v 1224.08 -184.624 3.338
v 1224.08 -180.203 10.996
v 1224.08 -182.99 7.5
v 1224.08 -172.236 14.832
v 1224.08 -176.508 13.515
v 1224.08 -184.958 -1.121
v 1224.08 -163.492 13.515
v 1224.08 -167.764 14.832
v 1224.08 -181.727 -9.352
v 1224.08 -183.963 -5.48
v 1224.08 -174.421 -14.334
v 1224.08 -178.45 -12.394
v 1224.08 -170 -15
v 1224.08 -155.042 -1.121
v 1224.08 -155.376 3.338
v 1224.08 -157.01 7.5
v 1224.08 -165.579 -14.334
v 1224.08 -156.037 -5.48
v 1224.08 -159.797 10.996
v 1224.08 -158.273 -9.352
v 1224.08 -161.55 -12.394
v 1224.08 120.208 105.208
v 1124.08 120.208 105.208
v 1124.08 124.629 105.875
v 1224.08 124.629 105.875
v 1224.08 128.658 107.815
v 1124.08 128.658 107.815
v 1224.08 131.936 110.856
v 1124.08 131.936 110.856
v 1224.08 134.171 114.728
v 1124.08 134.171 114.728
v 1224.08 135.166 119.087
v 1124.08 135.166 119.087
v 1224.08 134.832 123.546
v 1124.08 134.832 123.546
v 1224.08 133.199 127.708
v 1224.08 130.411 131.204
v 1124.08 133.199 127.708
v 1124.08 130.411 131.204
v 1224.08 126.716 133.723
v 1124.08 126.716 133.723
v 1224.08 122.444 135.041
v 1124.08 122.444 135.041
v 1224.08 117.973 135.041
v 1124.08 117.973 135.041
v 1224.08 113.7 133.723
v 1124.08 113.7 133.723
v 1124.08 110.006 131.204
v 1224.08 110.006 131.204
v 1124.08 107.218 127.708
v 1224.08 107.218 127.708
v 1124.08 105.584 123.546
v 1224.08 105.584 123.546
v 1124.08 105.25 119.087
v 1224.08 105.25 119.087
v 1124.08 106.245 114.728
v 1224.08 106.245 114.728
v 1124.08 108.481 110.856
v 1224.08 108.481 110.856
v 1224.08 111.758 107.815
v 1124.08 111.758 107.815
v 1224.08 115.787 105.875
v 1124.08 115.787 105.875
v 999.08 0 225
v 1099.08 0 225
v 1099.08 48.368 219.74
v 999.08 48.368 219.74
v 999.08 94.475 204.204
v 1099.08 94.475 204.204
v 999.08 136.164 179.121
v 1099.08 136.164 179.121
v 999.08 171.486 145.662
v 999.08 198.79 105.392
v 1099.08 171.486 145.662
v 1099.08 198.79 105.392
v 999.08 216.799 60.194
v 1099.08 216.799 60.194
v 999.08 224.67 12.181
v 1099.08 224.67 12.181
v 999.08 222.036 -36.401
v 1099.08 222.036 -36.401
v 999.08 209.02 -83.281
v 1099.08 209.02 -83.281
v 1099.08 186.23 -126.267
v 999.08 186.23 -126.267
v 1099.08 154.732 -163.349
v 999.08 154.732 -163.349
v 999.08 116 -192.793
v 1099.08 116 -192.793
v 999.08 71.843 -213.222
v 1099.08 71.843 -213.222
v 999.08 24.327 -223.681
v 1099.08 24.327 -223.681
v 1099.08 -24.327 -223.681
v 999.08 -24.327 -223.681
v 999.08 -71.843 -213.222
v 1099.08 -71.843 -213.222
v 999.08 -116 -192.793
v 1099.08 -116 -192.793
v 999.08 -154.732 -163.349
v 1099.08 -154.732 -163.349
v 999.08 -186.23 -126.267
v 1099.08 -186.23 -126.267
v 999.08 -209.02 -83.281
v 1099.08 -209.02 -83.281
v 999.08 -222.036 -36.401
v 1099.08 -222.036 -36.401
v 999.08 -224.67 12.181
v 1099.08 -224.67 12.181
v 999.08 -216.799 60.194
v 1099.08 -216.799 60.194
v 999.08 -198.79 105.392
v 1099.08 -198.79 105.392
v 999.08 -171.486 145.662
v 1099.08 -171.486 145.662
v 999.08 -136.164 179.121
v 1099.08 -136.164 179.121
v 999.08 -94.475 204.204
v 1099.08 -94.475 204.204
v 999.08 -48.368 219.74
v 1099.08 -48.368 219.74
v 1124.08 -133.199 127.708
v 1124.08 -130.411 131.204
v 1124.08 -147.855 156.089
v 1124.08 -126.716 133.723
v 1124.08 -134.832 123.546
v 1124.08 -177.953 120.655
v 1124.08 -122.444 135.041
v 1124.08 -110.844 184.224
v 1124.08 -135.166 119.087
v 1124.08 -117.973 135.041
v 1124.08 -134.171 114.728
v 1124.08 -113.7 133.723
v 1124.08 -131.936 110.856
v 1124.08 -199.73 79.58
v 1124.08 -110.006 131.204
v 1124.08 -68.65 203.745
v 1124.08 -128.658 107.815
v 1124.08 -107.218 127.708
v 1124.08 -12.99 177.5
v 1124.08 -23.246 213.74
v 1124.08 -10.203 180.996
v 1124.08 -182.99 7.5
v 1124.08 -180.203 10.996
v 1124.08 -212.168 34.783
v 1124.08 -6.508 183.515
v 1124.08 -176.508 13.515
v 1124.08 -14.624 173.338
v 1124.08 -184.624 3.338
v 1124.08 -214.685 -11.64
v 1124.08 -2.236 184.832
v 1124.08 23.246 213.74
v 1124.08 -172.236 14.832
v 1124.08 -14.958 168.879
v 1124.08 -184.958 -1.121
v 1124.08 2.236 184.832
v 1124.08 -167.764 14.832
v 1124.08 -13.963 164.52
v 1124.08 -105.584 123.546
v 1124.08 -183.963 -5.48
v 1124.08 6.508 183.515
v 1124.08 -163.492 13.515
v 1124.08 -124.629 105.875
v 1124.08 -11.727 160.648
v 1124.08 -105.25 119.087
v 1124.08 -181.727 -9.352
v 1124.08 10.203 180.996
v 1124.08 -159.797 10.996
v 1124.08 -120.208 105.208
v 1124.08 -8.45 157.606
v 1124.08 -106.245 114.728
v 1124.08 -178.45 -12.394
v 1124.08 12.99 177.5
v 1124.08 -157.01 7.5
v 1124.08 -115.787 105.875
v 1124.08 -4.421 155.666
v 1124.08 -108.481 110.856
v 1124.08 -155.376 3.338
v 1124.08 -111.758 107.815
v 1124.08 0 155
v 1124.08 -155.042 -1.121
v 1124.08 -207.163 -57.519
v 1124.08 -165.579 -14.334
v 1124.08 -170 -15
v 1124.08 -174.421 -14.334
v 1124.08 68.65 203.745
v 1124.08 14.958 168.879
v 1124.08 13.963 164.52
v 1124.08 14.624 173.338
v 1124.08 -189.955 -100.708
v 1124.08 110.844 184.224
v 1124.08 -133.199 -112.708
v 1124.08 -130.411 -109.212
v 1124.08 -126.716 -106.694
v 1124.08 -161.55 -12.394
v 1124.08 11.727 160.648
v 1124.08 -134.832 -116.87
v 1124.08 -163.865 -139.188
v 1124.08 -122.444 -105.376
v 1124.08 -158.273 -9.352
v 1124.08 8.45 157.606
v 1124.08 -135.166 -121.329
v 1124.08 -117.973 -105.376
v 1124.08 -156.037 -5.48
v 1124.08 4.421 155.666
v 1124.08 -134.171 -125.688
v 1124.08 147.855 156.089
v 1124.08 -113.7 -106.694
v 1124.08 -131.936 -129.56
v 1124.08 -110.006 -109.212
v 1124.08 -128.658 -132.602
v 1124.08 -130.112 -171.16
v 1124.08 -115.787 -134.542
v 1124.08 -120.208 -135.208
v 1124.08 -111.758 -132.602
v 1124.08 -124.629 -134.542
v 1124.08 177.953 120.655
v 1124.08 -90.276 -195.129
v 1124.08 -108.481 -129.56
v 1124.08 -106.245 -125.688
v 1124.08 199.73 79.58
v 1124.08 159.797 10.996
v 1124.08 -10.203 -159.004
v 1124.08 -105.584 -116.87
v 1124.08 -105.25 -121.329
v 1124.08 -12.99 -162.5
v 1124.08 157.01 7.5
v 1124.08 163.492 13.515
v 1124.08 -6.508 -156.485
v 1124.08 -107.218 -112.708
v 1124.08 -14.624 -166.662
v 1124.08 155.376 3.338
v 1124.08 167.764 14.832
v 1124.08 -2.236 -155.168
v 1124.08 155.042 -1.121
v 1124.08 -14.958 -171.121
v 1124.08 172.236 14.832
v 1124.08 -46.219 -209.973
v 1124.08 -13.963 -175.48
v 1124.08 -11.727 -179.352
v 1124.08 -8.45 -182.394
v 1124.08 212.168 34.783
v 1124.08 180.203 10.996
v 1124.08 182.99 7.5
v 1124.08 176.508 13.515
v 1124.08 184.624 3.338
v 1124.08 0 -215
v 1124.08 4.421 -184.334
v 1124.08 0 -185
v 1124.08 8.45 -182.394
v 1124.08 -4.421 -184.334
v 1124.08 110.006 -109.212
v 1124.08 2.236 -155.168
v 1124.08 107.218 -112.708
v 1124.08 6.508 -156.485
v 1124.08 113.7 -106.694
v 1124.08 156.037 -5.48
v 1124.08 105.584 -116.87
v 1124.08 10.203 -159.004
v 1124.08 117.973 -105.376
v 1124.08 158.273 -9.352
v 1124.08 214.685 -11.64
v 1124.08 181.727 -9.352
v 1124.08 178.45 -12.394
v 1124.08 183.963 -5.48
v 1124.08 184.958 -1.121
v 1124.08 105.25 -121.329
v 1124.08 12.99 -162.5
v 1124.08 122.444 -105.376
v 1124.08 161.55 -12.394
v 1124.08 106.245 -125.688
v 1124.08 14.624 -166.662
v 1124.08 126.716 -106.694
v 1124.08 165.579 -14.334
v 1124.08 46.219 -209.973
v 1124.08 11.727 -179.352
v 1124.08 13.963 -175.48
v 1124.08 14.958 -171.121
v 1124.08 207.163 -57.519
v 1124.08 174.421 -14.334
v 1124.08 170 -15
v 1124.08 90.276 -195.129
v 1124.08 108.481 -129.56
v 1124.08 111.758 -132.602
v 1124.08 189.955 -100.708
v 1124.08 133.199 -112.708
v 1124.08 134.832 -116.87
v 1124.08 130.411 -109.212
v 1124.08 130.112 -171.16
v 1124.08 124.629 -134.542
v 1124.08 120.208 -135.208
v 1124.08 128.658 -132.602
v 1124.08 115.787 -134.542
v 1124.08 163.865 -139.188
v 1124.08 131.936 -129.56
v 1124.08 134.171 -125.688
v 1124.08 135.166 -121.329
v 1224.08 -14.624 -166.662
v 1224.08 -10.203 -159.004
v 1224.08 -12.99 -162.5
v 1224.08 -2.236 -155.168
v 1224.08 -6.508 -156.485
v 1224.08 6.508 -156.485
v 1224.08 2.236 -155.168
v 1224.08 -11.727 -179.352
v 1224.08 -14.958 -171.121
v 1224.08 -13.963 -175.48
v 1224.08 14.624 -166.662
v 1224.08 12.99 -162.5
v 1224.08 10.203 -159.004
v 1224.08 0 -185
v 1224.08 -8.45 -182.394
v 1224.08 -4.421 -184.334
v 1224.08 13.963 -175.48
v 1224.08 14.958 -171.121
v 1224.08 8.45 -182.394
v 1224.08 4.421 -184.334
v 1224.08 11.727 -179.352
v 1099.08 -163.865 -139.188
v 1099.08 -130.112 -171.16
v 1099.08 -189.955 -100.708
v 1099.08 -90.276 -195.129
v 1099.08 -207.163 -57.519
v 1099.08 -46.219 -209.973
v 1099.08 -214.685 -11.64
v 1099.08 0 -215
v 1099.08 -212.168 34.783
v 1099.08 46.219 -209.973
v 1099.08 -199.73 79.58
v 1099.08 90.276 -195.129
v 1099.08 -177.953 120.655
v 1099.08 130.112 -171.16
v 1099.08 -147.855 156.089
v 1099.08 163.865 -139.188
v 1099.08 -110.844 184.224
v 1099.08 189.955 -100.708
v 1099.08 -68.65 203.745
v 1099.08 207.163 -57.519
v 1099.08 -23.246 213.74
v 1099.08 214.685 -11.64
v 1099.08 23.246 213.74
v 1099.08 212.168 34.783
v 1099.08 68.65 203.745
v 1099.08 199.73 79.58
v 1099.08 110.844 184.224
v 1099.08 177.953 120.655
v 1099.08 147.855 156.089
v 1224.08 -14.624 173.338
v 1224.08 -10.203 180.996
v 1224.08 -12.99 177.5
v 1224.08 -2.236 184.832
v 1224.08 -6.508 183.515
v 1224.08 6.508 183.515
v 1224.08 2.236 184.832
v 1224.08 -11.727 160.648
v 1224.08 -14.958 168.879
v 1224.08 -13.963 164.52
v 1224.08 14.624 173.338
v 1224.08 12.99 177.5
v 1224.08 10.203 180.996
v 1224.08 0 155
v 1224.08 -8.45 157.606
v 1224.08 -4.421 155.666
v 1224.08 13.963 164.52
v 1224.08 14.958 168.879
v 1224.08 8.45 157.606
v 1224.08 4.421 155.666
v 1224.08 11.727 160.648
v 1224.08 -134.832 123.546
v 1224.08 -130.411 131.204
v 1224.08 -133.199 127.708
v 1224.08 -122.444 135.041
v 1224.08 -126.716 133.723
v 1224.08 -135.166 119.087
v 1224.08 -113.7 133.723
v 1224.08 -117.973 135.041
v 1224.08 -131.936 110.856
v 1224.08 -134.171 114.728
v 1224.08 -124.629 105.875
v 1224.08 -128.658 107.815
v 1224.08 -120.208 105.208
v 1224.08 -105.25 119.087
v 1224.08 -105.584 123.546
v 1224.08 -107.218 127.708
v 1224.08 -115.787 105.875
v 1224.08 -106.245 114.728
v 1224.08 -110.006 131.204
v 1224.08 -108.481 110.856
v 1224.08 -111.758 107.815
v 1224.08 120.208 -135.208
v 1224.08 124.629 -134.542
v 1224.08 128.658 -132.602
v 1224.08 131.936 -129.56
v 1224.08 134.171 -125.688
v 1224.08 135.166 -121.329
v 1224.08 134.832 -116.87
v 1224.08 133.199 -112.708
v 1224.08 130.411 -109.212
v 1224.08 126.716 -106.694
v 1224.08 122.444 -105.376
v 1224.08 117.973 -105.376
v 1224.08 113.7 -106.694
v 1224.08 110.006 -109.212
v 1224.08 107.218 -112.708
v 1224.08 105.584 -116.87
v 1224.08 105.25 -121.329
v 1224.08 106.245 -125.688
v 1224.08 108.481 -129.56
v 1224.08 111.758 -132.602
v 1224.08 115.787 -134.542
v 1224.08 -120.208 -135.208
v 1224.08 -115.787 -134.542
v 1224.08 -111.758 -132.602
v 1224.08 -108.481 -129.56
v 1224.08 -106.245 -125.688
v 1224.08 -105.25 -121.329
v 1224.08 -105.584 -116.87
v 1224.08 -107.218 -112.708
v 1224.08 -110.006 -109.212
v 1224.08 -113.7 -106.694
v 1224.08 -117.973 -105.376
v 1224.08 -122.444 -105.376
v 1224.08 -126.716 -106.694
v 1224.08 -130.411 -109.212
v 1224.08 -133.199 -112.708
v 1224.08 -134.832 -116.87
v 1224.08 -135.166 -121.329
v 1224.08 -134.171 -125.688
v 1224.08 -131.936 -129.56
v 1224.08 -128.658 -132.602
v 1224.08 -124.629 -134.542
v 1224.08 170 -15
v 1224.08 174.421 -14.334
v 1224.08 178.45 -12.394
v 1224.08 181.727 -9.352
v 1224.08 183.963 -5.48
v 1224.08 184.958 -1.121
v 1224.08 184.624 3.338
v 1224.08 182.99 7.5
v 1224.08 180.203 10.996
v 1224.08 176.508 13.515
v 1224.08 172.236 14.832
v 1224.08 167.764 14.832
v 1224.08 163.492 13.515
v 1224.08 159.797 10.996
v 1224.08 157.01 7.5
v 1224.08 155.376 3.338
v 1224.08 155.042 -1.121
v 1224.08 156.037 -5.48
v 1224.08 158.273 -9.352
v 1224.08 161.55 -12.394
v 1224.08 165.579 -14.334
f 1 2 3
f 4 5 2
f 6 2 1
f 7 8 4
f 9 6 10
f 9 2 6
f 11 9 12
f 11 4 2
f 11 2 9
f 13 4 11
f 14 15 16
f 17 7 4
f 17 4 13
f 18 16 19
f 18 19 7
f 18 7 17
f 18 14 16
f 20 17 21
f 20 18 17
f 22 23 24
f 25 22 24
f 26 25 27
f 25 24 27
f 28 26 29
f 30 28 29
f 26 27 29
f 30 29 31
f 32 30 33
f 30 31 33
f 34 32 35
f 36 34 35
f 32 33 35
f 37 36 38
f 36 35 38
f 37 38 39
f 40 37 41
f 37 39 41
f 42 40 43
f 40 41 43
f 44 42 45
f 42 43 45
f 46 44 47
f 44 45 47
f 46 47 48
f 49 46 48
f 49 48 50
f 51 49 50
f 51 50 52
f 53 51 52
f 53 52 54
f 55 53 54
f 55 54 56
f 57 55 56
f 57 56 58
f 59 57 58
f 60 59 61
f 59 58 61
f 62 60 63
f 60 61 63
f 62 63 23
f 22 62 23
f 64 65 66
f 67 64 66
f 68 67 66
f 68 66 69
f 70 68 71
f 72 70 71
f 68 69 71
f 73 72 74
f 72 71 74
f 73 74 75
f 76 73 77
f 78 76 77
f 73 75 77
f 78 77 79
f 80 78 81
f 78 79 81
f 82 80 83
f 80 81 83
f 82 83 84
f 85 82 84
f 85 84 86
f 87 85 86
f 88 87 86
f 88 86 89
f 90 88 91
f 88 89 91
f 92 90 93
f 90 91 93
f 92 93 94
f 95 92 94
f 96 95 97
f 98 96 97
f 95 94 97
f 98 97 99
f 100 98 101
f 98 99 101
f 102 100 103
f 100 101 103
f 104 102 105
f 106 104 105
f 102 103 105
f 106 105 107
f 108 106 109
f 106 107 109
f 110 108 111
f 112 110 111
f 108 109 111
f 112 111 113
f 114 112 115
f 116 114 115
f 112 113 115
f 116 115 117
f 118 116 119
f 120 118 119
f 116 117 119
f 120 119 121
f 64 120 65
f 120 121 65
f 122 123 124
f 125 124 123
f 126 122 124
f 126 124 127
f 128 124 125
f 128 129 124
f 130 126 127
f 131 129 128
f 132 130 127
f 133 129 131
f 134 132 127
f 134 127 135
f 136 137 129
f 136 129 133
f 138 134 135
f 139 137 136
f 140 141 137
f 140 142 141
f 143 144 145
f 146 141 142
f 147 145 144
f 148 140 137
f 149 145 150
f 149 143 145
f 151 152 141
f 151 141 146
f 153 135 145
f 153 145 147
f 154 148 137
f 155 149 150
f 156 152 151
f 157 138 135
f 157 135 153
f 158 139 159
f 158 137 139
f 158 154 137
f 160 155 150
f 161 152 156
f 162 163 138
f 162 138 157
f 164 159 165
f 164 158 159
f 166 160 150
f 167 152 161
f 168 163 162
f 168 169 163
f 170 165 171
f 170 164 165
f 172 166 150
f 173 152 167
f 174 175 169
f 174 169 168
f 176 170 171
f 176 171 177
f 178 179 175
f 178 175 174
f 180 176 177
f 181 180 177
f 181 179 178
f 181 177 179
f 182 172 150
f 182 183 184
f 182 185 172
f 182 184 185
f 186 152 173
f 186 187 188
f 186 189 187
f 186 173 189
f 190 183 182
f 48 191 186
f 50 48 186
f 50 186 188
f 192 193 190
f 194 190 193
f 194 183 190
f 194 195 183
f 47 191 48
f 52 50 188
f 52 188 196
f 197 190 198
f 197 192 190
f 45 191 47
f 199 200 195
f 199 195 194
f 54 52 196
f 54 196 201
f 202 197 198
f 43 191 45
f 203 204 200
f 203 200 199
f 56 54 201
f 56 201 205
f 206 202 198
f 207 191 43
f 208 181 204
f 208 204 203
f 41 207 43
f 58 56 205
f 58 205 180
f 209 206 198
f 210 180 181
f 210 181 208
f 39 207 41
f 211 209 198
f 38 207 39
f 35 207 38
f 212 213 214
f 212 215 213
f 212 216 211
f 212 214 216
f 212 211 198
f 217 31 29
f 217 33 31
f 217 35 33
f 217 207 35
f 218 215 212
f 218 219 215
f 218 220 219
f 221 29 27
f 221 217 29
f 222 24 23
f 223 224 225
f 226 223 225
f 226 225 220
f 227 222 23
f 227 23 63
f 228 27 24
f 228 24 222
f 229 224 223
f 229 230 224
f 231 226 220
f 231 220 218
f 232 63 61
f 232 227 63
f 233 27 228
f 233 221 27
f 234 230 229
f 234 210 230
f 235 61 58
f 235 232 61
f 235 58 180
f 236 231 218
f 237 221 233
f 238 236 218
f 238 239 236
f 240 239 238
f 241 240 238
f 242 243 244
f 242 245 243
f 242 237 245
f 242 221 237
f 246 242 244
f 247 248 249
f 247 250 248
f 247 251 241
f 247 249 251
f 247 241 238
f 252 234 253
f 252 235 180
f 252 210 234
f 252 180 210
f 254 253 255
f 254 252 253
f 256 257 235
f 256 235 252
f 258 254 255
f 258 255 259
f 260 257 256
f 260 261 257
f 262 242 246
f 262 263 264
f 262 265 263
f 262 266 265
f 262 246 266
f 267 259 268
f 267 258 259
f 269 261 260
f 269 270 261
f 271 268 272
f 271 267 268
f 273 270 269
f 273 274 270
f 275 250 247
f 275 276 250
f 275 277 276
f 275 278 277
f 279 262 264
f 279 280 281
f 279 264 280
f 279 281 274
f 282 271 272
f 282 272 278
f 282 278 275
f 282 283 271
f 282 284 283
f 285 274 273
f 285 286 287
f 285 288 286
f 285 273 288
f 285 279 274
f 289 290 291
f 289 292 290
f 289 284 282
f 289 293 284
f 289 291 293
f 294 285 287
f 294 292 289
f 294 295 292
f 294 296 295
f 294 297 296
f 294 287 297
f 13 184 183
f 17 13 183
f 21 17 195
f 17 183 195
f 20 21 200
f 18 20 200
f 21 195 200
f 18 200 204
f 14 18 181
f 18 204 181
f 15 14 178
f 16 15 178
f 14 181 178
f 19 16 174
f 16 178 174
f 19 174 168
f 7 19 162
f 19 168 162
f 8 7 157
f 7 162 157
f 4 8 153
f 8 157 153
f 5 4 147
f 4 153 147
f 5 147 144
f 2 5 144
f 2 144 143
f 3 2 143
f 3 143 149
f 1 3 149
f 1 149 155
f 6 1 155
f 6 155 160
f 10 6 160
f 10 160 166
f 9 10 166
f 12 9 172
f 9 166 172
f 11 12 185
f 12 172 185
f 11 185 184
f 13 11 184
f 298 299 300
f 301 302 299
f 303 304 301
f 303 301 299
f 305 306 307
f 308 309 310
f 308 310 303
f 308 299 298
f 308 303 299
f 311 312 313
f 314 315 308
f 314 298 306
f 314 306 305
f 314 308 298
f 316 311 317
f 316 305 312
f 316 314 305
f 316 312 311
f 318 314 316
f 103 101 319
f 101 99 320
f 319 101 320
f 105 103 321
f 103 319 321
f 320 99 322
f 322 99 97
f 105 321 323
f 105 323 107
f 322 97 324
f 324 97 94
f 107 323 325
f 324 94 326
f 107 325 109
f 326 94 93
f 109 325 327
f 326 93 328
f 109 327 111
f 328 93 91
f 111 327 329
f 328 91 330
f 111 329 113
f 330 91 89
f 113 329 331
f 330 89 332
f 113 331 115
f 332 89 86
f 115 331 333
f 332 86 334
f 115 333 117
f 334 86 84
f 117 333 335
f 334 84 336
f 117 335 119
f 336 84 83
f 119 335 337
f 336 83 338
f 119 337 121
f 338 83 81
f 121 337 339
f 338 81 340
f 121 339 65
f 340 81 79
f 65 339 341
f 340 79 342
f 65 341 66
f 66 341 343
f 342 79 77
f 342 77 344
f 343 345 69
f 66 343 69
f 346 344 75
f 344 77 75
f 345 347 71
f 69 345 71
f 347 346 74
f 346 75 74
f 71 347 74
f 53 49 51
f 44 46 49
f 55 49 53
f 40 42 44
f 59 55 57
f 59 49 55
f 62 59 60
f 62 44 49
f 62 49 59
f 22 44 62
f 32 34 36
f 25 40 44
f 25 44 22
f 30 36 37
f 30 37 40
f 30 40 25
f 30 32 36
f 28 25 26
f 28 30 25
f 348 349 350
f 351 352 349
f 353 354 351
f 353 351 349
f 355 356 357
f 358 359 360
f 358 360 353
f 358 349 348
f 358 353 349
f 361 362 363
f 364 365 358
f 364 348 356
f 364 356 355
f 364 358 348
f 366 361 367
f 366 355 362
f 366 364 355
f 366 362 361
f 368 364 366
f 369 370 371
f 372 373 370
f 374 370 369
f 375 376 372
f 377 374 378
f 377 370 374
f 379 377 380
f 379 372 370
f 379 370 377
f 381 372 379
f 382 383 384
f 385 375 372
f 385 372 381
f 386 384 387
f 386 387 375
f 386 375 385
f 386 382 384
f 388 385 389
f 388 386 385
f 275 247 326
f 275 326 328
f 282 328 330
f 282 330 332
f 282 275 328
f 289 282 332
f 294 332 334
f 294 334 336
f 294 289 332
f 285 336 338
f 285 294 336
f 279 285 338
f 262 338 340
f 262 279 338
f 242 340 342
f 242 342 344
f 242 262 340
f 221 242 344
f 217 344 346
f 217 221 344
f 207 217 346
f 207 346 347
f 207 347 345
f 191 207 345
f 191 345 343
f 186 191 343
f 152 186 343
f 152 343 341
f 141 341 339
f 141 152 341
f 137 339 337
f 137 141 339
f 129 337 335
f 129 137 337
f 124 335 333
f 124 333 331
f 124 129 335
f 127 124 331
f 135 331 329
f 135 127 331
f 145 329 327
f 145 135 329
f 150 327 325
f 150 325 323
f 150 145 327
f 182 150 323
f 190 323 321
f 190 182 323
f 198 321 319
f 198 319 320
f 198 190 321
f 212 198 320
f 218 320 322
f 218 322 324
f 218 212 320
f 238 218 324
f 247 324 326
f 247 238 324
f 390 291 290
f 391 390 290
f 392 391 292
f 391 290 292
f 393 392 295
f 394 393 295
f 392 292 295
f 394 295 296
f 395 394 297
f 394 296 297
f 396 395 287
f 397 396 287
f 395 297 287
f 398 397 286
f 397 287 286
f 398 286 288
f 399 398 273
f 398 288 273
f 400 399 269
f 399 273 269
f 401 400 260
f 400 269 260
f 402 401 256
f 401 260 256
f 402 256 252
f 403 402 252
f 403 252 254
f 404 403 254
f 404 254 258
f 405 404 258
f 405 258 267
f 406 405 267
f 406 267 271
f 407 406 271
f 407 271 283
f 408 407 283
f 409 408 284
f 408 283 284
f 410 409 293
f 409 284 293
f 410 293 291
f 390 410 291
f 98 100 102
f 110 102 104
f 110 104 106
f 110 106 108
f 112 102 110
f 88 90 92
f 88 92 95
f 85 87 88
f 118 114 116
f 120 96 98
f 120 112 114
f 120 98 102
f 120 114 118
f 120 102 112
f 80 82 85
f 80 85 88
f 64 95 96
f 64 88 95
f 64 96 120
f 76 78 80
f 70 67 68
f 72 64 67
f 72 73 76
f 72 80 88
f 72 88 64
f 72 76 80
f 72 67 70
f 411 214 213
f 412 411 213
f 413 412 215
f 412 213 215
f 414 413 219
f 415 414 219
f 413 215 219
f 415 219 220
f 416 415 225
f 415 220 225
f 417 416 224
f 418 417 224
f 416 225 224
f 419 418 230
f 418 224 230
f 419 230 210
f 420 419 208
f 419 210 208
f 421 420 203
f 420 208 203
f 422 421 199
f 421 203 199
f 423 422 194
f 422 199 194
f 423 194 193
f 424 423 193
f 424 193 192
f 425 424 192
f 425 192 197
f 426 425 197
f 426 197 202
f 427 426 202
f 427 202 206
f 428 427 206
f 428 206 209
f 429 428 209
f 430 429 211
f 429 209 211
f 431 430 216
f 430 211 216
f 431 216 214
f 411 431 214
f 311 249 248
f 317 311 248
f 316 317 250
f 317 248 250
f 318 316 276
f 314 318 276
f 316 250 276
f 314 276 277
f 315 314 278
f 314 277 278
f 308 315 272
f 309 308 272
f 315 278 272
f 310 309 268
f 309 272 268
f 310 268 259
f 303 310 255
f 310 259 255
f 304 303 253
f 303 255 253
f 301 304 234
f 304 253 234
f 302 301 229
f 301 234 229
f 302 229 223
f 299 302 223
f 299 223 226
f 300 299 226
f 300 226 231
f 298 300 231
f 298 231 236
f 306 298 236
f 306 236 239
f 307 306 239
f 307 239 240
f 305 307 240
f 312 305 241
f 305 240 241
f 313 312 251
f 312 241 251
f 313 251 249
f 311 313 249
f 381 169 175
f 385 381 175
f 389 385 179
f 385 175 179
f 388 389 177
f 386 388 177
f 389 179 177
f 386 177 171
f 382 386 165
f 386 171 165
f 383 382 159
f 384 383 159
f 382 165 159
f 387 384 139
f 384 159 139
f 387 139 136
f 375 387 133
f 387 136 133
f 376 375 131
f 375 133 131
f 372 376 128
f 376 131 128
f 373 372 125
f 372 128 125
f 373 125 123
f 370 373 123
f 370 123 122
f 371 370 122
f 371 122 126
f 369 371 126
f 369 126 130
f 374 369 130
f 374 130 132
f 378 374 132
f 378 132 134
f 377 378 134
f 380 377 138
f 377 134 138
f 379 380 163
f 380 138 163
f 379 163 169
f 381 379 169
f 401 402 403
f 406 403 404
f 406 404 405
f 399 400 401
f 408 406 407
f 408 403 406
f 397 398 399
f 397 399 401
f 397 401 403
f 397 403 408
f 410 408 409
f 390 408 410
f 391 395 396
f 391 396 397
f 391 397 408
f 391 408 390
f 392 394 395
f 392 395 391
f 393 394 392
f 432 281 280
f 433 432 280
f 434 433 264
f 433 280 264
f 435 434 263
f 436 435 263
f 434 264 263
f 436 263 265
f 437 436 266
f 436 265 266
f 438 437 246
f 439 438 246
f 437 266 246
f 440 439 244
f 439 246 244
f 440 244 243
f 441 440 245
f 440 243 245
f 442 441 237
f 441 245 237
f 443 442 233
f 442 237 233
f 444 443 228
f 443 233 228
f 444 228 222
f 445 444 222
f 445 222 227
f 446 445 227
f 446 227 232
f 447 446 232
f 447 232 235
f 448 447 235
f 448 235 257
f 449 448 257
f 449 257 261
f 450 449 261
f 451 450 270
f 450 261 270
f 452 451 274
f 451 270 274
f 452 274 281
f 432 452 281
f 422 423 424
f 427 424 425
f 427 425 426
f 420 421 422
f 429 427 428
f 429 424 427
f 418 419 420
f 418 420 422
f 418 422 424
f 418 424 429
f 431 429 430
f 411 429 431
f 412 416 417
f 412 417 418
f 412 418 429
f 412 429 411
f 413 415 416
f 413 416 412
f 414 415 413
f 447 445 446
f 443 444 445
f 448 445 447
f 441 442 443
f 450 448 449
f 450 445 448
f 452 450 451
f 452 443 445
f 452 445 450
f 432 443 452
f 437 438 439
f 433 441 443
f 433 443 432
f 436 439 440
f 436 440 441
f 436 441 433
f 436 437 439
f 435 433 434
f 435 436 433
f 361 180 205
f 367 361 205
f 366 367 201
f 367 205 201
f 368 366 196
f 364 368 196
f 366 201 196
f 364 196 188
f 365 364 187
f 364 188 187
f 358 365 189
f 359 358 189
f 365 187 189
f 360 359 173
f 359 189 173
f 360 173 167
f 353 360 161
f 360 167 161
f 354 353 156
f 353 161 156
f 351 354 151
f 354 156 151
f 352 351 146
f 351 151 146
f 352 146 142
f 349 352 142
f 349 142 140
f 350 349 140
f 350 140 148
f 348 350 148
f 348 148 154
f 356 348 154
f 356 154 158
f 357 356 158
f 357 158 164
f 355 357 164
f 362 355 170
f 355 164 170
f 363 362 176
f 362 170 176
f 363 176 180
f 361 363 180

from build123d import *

# Parameters (mm, degrees)
SKETCH2_R           = 215
BOSS_EXTRUDE1_DEPTH = 25
SKETCH3_R           = 225
BOSS_EXTRUDE2_DEPTH = 100
SKETCH5_R           = 15
BOSS_EXTRUDE3_DEPTH = 100


with BuildPart() as part:
    # Sketch2 → Boss-Extrude1 (new body)
    with BuildSketch(Plane(origin=(1124.08, 0, 0), x_dir=(0, 0, -1), z_dir=(1, 0, 0))):
        Circle(SKETCH2_R)
    extrude(amount=-BOSS_EXTRUDE1_DEPTH)

    # Sketch3 → Boss-Extrude2 (add)
    with BuildSketch(Plane.ZY.offset(-1099.08)):
        Circle(SKETCH3_R)
    extrude(amount=BOSS_EXTRUDE2_DEPTH)

    # Sketch5 → Boss-Extrude3 (add)
    with BuildSketch(Plane(origin=(1124.08, 0, 0), x_dir=(0, 0, -1), z_dir=(1, 0, 0))):
        with Locations((0, 170)):
            Circle(SKETCH5_R)
        with Locations((120.208152802, 120.208152802)):
            Circle(SKETCH5_R)
        with Locations((170, 0)):
            Circle(SKETCH5_R)
        with Locations((120.208152802, -120.208152802)):
            Circle(SKETCH5_R)
        with Locations((0, -170)):
            Circle(SKETCH5_R)
        with Locations((-120.208152802, -120.208152802)):
            Circle(SKETCH5_R)
        with Locations((-170, 0)):
            Circle(SKETCH5_R)
        with Locations((-120.208152802, 120.208152802)):
            Circle(SKETCH5_R)
    extrude(amount=BOSS_EXTRUDE3_DEPTH)


solid = part.part
